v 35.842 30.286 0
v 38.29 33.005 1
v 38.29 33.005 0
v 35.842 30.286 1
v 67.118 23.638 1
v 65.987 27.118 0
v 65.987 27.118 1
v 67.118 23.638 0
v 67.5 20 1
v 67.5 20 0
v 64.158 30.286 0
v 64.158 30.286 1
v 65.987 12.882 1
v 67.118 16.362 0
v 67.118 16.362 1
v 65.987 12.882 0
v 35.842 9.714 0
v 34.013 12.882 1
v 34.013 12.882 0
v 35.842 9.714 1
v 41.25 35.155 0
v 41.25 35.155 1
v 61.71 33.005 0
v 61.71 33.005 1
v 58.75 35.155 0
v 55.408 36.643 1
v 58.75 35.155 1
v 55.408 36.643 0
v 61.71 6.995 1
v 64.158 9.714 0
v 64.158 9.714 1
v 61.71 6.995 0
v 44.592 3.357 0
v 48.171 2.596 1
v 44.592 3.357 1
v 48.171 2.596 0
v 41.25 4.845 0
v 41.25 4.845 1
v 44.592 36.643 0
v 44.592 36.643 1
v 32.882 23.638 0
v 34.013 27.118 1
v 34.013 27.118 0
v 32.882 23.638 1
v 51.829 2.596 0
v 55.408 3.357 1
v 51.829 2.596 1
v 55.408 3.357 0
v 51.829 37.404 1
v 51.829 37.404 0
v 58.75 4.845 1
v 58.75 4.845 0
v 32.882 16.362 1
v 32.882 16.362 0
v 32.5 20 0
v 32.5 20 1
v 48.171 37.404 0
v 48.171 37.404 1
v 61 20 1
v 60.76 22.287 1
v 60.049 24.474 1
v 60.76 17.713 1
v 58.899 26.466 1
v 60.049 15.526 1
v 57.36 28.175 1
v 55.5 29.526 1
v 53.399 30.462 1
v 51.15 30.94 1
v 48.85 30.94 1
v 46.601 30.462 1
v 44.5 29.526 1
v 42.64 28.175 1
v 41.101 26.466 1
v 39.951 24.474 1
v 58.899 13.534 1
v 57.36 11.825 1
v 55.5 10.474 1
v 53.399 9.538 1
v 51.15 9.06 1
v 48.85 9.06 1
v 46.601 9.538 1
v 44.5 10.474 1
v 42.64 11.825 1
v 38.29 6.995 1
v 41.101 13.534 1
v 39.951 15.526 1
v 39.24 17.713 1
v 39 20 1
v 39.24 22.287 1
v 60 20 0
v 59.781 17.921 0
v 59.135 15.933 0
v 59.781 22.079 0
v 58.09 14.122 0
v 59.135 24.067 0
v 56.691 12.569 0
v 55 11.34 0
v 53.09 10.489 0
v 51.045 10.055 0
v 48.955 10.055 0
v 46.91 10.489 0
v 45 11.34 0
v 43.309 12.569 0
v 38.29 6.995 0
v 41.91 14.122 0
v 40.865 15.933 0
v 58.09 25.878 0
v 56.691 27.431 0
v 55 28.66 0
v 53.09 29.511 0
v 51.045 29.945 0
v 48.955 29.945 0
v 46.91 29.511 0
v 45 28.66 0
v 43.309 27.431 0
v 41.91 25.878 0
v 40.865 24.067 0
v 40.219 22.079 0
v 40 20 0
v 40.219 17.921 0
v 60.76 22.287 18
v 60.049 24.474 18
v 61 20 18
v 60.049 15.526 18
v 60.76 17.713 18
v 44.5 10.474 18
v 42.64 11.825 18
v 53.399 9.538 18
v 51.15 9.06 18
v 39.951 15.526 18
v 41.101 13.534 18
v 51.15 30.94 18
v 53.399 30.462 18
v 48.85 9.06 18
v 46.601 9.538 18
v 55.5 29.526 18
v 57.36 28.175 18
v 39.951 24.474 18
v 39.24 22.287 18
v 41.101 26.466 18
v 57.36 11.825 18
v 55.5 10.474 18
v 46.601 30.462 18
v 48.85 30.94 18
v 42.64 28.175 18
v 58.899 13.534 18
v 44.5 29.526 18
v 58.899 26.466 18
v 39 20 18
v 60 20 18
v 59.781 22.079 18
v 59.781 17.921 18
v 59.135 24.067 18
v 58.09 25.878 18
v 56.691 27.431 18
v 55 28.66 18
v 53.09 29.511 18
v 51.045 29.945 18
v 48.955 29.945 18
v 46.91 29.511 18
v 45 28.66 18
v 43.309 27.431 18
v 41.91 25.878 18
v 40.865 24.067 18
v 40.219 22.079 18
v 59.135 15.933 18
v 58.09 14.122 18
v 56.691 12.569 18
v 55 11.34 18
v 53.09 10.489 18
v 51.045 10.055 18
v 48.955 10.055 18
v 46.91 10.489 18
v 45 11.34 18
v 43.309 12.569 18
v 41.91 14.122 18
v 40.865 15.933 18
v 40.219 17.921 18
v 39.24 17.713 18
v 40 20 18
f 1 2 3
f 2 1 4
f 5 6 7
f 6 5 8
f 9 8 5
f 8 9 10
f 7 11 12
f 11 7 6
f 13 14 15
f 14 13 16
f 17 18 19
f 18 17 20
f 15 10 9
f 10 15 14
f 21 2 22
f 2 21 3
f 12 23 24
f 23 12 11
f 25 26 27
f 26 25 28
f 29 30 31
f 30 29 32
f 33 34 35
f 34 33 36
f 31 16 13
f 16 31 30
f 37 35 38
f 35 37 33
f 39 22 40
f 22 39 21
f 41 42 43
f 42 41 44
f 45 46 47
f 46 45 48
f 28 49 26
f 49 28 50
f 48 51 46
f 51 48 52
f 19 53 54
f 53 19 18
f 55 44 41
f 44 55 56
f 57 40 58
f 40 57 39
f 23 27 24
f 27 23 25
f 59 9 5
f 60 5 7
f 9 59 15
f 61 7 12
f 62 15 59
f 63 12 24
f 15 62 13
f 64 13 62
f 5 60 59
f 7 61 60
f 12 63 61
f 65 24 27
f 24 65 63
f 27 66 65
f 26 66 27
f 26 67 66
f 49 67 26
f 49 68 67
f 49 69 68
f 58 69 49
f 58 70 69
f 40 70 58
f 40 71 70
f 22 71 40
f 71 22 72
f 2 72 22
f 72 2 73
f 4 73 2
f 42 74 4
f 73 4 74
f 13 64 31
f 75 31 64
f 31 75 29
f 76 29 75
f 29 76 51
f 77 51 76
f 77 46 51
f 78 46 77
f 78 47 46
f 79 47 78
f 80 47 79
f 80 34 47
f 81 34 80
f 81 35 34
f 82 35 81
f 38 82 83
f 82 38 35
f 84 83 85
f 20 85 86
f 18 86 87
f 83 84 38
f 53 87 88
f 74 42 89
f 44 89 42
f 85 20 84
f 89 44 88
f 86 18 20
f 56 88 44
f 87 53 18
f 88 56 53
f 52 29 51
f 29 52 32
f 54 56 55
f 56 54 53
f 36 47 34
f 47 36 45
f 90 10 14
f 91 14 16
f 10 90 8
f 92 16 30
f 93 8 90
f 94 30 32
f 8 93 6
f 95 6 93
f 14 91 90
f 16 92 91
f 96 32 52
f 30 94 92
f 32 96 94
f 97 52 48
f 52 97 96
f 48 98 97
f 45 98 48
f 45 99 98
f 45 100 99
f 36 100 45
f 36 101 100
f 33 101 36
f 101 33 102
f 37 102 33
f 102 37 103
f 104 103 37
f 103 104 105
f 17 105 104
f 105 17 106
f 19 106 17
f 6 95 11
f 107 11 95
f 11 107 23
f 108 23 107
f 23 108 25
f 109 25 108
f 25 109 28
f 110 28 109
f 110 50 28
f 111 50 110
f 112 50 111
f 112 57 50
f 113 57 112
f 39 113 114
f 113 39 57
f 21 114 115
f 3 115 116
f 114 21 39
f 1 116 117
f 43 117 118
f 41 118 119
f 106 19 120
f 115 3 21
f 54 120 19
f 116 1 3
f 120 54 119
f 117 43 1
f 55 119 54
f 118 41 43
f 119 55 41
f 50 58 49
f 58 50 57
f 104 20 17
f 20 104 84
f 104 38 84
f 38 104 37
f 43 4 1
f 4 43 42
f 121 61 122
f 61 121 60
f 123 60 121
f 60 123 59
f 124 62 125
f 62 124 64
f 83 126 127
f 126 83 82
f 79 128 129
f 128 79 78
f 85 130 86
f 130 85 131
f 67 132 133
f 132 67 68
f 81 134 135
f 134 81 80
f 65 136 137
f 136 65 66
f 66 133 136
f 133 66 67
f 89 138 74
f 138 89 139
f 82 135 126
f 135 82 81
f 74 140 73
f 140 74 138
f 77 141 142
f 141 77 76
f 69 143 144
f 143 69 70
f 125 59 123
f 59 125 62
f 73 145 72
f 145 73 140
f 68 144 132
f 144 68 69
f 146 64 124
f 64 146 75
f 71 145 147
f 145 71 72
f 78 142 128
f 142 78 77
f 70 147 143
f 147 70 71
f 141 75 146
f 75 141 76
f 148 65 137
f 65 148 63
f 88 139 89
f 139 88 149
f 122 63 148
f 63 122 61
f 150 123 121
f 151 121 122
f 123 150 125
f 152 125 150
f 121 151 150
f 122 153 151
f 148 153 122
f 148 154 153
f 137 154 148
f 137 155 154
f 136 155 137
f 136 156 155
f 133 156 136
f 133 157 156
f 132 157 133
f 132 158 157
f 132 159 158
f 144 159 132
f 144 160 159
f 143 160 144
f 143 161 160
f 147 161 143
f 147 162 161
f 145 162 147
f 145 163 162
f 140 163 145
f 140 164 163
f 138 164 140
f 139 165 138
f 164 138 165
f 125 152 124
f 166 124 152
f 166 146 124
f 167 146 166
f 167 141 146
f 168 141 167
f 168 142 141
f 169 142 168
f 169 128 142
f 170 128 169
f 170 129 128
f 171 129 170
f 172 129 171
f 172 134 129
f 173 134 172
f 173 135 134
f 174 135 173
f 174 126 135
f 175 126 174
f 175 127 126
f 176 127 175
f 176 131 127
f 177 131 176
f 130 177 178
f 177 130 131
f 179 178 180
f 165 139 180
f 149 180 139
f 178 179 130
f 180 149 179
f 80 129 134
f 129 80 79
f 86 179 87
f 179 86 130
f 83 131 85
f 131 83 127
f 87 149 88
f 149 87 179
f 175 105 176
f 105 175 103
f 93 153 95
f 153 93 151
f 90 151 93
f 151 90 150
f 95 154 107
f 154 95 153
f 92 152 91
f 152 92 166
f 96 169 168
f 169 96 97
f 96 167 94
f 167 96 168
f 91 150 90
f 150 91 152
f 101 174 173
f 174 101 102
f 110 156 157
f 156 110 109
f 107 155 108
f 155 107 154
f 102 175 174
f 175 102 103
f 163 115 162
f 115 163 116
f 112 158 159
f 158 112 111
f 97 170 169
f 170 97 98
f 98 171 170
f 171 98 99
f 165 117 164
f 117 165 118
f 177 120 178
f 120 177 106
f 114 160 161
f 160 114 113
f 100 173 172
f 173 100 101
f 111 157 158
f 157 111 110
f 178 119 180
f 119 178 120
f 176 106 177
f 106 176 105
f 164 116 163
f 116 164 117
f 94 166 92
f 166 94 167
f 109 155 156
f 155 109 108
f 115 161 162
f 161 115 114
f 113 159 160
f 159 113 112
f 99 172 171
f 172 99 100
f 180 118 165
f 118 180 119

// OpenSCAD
translate([50,20,0]) {
    difference(){
    union() {
        cylinder(1, 35/2,35/2);
        cylinder(18, 11,11);
        }
    cylinder(18,10,10);
        
        }
}
